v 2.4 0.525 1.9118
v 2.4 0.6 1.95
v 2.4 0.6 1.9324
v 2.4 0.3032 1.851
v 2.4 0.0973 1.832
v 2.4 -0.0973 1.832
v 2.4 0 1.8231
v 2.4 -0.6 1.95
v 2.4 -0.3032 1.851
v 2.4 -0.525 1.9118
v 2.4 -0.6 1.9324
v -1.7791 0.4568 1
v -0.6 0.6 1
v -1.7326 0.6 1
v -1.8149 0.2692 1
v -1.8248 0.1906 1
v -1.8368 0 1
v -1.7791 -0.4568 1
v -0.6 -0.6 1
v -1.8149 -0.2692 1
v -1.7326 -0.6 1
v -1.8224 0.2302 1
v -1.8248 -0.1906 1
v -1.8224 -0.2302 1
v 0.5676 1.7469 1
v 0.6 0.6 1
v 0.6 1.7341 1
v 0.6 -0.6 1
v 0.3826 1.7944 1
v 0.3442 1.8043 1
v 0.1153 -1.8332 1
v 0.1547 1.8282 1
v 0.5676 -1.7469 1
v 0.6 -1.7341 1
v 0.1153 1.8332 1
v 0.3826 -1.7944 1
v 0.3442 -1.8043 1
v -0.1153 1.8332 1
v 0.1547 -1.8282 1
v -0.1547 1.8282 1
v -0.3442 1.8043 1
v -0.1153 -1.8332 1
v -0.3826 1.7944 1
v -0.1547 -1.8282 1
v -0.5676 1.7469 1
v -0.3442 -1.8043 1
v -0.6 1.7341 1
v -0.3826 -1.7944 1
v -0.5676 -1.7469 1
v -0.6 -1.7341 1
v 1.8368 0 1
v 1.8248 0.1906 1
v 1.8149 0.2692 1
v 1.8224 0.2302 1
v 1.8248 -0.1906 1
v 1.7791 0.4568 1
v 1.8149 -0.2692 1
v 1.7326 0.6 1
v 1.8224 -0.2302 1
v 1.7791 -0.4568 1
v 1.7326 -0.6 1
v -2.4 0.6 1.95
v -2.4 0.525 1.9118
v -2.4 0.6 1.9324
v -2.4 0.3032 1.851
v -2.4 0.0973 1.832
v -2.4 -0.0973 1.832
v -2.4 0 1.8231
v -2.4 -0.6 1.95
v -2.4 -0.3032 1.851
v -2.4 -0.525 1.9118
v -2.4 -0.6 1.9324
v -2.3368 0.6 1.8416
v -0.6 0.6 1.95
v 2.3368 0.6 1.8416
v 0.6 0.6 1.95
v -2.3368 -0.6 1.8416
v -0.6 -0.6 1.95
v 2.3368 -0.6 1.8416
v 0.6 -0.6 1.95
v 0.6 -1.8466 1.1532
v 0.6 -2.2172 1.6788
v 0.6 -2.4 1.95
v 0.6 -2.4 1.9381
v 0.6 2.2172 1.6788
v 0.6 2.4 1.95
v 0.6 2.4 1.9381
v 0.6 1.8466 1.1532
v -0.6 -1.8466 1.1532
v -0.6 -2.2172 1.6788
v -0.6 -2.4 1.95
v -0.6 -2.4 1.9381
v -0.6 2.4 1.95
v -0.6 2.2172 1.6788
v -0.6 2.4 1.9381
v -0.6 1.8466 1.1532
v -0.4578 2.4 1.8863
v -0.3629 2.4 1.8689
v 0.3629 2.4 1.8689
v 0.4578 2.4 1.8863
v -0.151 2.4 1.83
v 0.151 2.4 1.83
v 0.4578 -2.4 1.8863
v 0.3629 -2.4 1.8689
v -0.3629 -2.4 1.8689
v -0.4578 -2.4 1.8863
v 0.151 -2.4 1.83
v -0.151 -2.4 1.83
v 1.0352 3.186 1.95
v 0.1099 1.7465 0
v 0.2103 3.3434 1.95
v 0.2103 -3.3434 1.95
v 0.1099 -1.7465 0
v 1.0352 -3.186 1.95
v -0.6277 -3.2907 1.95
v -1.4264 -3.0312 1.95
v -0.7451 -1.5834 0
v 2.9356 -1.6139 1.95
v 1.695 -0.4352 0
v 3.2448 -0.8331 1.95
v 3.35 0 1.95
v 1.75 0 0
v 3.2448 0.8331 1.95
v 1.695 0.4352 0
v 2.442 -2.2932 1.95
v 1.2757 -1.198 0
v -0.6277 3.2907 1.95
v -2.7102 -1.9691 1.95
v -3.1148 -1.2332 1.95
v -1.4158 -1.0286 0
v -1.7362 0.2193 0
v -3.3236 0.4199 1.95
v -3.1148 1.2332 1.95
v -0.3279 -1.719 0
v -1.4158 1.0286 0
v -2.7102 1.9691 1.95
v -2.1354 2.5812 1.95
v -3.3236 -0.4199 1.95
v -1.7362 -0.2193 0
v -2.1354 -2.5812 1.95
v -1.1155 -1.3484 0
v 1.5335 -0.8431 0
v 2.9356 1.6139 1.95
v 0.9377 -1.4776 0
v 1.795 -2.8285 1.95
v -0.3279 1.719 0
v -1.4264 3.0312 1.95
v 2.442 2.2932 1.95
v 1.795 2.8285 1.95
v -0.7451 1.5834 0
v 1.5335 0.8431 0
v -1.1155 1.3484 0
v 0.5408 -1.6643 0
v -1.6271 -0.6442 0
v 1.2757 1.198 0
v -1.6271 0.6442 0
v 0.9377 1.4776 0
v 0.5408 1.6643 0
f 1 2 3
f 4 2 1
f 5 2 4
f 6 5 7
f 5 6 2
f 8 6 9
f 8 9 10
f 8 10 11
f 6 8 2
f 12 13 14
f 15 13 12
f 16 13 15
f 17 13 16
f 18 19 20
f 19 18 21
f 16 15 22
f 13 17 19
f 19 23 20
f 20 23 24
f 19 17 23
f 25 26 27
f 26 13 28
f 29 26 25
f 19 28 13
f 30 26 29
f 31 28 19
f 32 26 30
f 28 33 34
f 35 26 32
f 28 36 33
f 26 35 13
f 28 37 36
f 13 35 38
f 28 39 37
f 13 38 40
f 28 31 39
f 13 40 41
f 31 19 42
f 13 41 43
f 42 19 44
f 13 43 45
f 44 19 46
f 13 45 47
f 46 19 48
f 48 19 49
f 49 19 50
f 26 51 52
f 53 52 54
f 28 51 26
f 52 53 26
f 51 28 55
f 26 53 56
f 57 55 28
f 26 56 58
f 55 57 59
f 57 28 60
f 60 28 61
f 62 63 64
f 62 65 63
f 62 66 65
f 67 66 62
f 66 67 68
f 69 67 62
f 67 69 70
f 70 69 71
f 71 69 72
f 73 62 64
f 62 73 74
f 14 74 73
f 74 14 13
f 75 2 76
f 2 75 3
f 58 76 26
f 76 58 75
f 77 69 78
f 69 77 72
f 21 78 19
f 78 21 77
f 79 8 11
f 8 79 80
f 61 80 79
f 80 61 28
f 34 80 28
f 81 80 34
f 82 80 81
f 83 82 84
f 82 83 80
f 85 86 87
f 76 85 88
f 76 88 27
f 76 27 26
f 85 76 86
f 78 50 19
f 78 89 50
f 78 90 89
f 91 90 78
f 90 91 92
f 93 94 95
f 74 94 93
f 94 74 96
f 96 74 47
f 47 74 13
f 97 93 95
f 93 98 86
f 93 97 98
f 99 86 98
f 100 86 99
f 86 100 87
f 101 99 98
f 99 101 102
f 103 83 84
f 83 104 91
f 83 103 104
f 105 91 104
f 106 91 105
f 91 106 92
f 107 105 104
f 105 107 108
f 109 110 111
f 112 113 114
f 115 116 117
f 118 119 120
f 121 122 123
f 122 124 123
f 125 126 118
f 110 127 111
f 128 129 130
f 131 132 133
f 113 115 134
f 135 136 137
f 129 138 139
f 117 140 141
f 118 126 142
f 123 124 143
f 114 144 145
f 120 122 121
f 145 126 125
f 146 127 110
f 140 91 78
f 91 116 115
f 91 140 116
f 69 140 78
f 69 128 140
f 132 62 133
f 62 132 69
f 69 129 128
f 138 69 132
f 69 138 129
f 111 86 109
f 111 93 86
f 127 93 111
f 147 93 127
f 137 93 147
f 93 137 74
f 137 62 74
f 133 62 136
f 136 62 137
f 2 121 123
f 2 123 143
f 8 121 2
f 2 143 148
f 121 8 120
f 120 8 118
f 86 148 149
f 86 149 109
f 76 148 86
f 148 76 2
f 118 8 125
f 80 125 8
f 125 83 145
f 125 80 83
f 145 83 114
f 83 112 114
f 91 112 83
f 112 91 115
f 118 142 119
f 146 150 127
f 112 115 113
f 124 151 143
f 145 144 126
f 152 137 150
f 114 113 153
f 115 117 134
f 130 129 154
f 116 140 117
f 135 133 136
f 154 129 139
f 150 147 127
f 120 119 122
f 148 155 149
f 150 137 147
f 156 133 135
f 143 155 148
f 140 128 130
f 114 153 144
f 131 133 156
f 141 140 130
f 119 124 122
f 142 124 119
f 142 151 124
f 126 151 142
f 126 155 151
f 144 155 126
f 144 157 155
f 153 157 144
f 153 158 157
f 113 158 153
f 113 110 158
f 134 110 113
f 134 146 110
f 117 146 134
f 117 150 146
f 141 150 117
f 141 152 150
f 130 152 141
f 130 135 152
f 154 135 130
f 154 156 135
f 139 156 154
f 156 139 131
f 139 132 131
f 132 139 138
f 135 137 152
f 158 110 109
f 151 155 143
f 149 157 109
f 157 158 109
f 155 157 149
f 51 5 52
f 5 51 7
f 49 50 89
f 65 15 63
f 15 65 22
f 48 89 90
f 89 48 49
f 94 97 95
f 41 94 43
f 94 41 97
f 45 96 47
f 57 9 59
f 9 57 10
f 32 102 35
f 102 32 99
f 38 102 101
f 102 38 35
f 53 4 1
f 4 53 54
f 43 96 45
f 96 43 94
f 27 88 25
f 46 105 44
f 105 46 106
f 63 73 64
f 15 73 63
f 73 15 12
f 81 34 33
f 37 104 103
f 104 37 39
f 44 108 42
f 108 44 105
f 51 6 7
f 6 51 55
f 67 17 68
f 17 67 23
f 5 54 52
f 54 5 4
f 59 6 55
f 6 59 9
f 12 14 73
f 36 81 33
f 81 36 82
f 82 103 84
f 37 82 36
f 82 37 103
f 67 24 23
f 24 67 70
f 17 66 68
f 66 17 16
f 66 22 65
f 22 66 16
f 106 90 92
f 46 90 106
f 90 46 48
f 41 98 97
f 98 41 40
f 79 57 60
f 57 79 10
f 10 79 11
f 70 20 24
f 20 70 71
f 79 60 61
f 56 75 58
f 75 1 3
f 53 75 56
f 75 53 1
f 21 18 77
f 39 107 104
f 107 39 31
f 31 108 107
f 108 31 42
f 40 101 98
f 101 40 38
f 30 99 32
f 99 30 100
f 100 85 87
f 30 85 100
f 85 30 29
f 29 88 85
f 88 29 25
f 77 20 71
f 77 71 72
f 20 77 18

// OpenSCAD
alt = 2;
larg=4.8;
comp=1.2;

difference(){

 cylinder(h=1.95, r1=1.75, r2=3.35, center=false,$fn=25);
union(){translate([-2.4,-.6,1]) cube([larg,comp,alt-1]);
translate([-.6,-2.4,1]) cube([comp,larg,alt-1]);}
}










alt1 = 2;
larg1=4.8;
comp1=1.2;
/*difference(){

union(){translate([-2.4,-.6,1]) cube([larg,comp,alt-1]);
translate([-.6,-2.4,1]) cube([comp,larg,alt-1]);}
*/

difference(){

   
    
  union(){
      translate([-2.4,-.6,1]) cube([larg1,comp1,alt1-1]);
      translate([-.6,-2.4,1]) cube([comp1,larg1,alt1-1]);
      }

translate([0,0,0.8]) cylinder(h=1.9, r1=1.7, r2=3, center=false,$fn=50);
}




/*
union(){translate([-2.4,-.6,0]) cube([larg,comp,alt]);
translate([-.6,-2.4,0]) cube([comp,larg,alt]);}
*/
